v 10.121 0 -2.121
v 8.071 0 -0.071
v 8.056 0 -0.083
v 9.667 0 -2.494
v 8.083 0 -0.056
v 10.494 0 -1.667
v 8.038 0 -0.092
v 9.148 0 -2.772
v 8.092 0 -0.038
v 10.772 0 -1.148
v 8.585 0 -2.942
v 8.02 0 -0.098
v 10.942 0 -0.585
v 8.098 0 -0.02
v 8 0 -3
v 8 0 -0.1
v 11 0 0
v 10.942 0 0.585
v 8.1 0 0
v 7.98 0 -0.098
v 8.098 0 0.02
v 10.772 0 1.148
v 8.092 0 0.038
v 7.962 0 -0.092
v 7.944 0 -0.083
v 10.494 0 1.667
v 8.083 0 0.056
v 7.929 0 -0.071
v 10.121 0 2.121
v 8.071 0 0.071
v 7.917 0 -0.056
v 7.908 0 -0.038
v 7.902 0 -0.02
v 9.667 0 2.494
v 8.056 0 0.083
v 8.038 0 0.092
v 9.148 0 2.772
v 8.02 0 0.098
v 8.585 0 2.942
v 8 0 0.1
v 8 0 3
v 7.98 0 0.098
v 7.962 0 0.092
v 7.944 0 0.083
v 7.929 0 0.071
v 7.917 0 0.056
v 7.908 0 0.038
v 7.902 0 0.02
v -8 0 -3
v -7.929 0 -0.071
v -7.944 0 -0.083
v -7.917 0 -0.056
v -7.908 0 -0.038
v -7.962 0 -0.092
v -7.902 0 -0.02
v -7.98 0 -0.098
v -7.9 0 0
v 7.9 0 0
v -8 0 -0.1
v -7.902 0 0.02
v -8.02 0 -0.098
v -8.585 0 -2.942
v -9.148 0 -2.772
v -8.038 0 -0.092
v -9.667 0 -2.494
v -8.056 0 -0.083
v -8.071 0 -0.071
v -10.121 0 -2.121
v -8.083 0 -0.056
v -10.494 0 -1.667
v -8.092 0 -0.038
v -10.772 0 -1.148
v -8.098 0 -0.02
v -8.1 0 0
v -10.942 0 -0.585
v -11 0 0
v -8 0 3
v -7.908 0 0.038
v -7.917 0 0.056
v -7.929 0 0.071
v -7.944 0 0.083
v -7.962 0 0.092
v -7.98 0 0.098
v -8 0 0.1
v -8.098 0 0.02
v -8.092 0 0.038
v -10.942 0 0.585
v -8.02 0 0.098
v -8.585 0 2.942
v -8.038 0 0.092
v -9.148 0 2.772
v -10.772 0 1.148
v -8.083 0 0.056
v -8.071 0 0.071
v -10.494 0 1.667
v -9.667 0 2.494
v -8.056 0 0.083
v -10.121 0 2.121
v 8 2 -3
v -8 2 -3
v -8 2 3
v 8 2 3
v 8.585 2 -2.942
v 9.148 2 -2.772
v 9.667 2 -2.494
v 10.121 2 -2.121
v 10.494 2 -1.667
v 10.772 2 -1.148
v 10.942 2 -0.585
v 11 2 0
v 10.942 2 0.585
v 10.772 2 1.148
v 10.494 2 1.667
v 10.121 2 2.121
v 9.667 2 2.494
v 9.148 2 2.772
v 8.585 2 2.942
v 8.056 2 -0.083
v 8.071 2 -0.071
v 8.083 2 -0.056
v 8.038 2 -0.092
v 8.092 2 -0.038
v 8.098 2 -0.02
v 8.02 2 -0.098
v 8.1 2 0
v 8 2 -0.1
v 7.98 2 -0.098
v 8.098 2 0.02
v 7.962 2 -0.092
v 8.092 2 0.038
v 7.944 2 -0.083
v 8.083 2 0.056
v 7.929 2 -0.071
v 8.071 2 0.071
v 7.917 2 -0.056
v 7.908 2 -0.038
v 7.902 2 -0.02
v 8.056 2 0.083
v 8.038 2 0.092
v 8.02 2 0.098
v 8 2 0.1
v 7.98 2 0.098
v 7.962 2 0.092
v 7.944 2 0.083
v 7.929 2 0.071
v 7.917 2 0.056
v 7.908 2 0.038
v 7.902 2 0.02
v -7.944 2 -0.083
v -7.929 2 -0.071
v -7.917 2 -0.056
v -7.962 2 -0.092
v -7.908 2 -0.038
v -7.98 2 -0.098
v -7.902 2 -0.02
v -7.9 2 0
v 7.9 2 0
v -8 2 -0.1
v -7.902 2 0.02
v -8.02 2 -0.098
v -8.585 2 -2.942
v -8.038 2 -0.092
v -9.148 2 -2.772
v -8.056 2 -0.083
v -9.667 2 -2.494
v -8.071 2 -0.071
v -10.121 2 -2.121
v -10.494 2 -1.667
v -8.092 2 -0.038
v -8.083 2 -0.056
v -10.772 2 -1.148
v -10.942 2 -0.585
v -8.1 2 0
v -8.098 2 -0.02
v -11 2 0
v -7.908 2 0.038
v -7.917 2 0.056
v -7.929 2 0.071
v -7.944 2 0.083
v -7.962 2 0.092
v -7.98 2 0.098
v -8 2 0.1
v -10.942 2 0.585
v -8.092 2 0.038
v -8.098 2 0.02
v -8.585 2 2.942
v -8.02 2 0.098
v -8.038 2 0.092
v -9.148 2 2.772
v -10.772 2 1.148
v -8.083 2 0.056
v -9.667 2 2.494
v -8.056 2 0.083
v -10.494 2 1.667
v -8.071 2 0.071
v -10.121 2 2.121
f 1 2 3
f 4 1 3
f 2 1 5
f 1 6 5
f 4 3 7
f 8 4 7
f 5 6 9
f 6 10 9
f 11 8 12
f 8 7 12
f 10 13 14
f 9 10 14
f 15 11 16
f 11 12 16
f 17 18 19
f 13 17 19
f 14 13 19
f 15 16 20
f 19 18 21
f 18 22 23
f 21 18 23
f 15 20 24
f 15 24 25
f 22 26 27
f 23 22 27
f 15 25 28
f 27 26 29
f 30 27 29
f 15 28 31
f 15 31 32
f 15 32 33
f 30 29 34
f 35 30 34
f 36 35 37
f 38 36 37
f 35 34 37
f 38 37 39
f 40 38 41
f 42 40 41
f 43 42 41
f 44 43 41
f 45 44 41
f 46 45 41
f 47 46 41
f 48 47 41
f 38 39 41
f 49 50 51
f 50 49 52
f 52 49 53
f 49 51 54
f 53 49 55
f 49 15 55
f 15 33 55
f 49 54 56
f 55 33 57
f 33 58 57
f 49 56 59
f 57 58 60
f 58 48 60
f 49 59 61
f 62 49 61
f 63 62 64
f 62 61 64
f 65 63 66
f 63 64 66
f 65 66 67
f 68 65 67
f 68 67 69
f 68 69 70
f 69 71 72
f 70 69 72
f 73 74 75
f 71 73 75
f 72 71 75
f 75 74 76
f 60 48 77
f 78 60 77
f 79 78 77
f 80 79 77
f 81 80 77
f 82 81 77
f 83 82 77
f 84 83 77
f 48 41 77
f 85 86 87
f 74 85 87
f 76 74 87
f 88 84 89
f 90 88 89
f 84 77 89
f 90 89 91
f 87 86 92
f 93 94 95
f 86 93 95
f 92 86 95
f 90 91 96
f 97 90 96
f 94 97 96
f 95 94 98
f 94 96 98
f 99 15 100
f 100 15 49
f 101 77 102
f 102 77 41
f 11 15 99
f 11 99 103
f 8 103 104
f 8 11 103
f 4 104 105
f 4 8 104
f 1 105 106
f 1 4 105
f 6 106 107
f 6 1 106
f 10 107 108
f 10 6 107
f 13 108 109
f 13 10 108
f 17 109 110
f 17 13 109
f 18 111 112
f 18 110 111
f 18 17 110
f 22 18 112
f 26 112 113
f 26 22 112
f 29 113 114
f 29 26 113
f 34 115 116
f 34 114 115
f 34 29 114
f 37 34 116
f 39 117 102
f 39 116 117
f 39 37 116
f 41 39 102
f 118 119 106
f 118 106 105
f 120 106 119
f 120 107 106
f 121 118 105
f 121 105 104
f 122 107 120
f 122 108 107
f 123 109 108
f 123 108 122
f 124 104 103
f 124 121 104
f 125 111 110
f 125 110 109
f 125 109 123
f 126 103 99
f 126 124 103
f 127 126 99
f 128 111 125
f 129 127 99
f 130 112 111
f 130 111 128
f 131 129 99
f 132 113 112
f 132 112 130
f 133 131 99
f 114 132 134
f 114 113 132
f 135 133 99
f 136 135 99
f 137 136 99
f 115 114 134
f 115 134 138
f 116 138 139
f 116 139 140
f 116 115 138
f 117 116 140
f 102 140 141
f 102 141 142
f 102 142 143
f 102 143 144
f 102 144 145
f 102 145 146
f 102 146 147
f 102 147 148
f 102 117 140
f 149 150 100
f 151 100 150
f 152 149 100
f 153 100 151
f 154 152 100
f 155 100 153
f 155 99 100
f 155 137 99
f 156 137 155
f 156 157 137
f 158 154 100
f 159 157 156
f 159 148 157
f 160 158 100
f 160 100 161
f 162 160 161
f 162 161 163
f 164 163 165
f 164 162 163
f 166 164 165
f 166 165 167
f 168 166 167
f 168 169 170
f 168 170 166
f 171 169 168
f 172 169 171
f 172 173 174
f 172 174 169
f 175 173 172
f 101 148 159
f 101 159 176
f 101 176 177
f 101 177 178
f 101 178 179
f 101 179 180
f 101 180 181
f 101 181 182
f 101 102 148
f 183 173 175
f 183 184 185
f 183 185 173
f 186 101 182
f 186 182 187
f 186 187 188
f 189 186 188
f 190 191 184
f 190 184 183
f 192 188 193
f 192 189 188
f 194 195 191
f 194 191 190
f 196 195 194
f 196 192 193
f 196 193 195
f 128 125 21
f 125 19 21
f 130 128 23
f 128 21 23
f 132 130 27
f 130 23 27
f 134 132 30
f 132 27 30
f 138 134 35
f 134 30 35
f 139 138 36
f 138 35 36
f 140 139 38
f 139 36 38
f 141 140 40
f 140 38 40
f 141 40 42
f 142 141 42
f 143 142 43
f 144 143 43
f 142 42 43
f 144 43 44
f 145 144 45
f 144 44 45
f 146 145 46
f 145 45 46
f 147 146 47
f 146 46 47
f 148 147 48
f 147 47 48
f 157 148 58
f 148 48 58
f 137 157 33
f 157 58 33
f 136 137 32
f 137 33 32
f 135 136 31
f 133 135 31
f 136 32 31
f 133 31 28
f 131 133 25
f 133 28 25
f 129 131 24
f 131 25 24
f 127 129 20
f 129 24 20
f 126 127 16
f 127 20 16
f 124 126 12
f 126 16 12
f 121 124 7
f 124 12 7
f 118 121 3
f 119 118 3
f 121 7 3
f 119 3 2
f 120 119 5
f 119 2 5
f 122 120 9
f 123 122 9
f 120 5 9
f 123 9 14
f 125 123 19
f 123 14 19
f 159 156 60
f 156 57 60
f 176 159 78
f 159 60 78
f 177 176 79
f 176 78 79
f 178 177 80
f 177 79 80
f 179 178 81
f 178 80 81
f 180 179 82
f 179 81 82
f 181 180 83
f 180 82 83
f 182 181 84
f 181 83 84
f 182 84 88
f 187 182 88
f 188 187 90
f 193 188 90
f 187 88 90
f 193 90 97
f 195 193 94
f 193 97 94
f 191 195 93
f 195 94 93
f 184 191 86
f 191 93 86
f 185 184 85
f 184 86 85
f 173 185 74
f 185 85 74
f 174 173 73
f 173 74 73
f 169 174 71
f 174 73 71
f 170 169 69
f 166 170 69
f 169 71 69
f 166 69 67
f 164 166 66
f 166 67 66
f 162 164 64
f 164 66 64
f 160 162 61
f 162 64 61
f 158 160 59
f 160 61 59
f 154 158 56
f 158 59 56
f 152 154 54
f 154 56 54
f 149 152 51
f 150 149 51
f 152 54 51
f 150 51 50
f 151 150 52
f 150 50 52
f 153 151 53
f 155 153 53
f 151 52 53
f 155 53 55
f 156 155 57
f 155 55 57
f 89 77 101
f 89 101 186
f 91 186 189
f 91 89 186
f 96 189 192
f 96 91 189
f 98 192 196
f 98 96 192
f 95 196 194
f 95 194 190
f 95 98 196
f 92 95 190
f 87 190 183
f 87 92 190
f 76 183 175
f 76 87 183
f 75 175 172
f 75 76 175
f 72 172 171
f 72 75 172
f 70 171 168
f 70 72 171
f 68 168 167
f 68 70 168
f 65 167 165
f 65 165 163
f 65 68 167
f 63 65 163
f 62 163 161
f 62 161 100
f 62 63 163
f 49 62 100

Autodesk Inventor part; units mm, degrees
ref_plane "YZ Plane" through (0, 0, 0) normal (1, 0, 0) x (0, 1, 0)
ref_plane "XZ Plane" through (0, 0, 0) normal (0, 1, 0) x (-1, 0, 0)
ref_plane "XY Plane" through (0, 0, 0) normal (0, 0, 1) x (1, 0, 0)
sketch "Sketch1" plane through (0, 0, 0) normal (0, 1, 0) x (-1, 0, 0)
  line L0 (-8, -3) -> (8, -3)
  line L1 (8, -3) -> (8, 3)
  line L2 (8, 3) -> (-8, 3)
  line L3 (-8, 3) -> (-8, -3)
  line L4 (-8, -3) -> (8, 3) construction
  line L5 (8, -3) -> (-8, 3) construction
  circle A0 centre (8, 0) radius 3
  circle A1 centre (-8, 0) radius 3
  point P0 (0, 0)
  dimension "d0" = 16
  dimension "d1" = 6
  dimension "d2" = 6
  dimension "d3" = 6
extrude "Extrusion1" add sketch "Sketch1" along normal blind 2
sketch "Sketch2" plane through (0, 2, 0) normal (0, 1, 0) x (1, 0, 0)
  arc A0 (8, -3) -> (8, 3) centre (8, 0) ccw projected
  arc A1 (-8, 3) -> (-8, -3) centre (-8, 0) ccw projected
  circle A2 centre (-8, 0) radius 1.5
  circle A3 centre (8, 0) radius 1.5
  point P0 (0, 0)
  dimension "d6" = 3
  dimension "d7" = 3
extrude "Extrusion2" cut sketch "Sketch2" against normal blind 2
sketch "Sketch3" plane through (0, 0, 0) normal (0, -1, 0) x (1, 0, 0)
  circle A0 centre (-8, 0) radius 1.5 projected
  circle A1 centre (8, 0) radius 1.5 projected
  arc A2 (8, -3) -> (8, 3) centre (8, 0) ccw projected
  arc A3 (-8, 3) -> (-8, -3) centre (-8, 0) ccw projected
  circle A4 centre (-8, 0) radius 0.1
  circle A5 centre (8, 0) radius 0.1
  point P0 (0, 0)
  dimension "d10" = 0.2
  dimension "d11" = 0.2
extrude "Extrusion3" add sketch "Sketch3" against normal blind 2
properties part number "tahlo5(b)_sablona"
